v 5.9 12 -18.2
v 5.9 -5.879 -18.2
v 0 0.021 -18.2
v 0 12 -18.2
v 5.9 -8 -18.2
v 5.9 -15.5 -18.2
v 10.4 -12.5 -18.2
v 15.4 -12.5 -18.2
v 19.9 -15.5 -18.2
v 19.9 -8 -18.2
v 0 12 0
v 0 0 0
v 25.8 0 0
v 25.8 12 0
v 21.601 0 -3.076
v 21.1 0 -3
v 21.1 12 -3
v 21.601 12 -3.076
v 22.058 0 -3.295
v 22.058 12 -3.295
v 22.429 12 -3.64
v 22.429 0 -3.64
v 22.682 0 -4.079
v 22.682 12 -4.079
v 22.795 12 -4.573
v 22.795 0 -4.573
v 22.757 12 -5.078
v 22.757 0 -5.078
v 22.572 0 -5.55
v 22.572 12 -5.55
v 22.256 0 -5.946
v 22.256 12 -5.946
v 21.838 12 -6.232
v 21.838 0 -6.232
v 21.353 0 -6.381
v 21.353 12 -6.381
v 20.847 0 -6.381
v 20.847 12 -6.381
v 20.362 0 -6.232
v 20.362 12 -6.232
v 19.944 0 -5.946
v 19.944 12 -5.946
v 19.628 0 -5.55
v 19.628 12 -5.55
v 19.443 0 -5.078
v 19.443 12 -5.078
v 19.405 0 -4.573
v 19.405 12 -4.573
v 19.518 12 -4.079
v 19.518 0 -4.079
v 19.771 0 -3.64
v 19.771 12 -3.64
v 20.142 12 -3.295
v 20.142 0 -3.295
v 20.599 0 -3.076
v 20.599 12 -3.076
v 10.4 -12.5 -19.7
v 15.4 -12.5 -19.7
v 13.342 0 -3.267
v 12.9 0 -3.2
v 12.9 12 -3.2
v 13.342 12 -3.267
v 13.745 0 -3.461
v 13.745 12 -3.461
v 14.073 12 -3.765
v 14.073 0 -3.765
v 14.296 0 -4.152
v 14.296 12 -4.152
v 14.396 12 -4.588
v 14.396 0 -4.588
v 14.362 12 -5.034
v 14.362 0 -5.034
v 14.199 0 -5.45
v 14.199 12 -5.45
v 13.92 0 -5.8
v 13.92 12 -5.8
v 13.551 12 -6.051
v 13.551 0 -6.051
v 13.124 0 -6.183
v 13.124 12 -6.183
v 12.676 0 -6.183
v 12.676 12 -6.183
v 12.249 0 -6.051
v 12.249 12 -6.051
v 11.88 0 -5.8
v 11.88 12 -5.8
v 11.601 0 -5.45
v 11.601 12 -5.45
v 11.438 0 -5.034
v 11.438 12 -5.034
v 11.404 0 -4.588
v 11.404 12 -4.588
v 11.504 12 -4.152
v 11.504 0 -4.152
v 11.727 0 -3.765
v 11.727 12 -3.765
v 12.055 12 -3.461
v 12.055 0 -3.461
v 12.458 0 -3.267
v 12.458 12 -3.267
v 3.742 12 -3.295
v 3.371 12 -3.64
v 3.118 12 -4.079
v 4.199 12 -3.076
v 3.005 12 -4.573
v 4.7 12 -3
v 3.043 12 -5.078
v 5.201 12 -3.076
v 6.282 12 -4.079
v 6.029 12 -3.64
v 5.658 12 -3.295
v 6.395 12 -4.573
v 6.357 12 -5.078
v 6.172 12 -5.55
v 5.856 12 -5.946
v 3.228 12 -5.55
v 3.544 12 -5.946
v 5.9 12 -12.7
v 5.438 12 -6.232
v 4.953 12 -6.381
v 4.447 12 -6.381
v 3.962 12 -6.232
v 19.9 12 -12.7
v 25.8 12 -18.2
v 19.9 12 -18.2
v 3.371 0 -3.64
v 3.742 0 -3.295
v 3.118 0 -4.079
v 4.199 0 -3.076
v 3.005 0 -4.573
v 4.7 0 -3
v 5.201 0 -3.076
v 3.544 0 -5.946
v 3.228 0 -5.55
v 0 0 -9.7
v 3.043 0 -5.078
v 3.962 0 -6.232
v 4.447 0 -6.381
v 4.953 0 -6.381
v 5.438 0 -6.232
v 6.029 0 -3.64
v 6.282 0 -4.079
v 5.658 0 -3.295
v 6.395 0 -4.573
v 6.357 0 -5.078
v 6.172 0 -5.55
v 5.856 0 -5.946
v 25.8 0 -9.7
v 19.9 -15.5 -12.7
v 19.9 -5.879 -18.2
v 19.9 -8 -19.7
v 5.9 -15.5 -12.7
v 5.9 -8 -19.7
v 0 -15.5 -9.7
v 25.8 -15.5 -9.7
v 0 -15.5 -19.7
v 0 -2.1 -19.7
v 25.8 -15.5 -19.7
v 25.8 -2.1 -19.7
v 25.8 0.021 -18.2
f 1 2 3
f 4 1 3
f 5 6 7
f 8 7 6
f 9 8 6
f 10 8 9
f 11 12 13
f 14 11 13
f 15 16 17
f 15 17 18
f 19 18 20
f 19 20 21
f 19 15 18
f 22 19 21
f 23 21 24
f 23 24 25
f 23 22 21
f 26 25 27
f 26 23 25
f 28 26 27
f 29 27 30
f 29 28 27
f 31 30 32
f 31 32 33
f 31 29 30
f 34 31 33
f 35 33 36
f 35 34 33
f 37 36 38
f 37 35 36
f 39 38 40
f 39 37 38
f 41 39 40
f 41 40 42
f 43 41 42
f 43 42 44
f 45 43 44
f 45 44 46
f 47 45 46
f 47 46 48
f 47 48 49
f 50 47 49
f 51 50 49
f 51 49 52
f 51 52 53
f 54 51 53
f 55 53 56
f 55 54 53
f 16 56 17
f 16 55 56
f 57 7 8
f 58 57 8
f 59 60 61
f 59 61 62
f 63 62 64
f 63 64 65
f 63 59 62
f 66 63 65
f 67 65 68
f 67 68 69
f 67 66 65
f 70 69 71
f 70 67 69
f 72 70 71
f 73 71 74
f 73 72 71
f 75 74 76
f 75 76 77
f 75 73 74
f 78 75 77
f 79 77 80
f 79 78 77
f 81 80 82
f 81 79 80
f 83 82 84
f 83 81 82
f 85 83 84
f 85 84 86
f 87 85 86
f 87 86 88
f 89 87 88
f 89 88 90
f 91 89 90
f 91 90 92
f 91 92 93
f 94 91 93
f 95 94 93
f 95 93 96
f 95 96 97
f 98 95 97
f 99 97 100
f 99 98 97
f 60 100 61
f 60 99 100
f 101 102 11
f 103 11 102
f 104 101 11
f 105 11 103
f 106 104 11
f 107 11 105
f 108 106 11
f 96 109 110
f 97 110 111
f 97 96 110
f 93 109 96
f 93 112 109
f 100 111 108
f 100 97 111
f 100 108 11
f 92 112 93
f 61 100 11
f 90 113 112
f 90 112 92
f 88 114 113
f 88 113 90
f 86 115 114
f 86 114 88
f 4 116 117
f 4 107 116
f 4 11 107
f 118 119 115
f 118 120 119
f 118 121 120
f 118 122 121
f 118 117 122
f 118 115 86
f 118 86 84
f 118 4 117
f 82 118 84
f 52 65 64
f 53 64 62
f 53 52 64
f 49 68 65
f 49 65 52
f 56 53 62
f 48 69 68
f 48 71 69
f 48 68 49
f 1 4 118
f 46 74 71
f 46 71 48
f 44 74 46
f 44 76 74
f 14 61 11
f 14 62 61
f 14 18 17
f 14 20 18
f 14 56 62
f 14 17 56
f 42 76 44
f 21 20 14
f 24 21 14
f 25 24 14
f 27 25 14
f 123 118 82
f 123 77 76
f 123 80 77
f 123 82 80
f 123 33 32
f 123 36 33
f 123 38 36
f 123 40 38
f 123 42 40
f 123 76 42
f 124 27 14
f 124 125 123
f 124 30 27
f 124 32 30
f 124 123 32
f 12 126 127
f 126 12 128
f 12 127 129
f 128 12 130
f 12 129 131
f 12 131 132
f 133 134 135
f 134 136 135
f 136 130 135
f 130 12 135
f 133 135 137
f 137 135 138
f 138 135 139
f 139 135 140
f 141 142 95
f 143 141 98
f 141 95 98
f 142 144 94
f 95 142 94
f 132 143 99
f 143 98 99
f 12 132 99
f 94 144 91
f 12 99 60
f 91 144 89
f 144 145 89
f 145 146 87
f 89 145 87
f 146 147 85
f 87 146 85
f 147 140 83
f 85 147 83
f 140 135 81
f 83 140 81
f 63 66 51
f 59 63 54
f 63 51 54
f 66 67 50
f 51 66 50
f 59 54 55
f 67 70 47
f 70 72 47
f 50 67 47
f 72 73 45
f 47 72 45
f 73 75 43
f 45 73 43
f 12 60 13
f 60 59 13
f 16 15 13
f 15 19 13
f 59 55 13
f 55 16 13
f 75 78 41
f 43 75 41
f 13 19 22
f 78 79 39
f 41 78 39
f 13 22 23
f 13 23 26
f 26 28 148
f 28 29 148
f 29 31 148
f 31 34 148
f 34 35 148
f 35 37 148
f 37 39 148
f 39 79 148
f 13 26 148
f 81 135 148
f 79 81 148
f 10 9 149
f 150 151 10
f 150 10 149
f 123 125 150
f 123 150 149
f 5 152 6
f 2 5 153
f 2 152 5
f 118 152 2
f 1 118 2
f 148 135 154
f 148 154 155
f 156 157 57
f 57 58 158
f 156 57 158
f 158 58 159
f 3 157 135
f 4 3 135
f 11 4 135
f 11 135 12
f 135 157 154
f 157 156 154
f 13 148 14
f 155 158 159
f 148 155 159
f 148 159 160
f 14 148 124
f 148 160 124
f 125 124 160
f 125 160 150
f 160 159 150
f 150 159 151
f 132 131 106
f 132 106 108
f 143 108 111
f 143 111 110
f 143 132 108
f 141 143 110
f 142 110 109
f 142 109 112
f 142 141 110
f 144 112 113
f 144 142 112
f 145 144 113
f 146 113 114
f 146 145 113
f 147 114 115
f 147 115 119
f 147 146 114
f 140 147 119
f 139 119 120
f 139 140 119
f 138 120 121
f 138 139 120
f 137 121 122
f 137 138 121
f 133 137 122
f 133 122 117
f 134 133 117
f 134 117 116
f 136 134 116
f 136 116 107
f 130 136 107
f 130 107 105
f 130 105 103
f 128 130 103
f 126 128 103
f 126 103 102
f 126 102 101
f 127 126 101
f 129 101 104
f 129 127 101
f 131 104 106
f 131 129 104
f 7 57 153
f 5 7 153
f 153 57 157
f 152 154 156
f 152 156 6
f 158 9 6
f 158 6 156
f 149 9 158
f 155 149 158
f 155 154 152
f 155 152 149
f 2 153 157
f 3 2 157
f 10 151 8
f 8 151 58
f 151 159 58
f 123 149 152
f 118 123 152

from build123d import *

# Parameters (mm, degrees)
SKETCH1_R           = 1.7
SKETCH1_R_2         = 1.5
BOSS_EXTRUDE1_DEPTH = 12
BOSS_EXTRUDE2_DEPTH = 15.5
SKETCH5_W           = 25.8
SKETCH5_H           = 1.5
BOSS_EXTRUDE3_DEPTH = 3
BOSS_EXTRUDE4_DEPTH = 1.5
CHAMFER1_SIZE       = 1.5


with BuildPart() as part:
    # Sketch1 → Boss-Extrude1 (new body)
    with BuildSketch(Plane(origin=(0, 0, 0), x_dir=(1, 0, 0), z_dir=(0, 1, 0))):
        Polygon((0, 0), (25.8, 0), (25.8, 18.2), (19.9, 18.2), (19.9, 12.7), (5.9, 12.7), (5.9, 18.2), (0, 18.2), align=None)
        with Locations(Location((4.7, 4.7, 0), (0, 0, 270))):
            Circle(SKETCH1_R, mode=Mode.SUBTRACT)
        with Locations(Location((12.9, 4.7, 0), (0, 0, 270))):
            Circle(SKETCH1_R_2, mode=Mode.SUBTRACT)
        with Locations(Location((21.1, 4.7, 0), (0, 0, 270))):
            Circle(SKETCH1_R, mode=Mode.SUBTRACT)
    extrude(amount=BOSS_EXTRUDE1_DEPTH)

    # Sketch4 → Boss-Extrude2 (add)
    with BuildSketch(Plane.XZ):
        Polygon((19.9, -18.2), (19.9, -12.7), (5.9, -12.7), (5.9, -18.2), (0, -18.2), (0, -9.7), (25.8, -9.7), (25.8, -18.2), align=None)
    extrude(amount=BOSS_EXTRUDE2_DEPTH)

    # Sketch5 → Boss-Extrude3 (add)
    with BuildSketch(Plane.XZ.offset(15.5)):
        with Locations((12.9, -18.95)):
            Rectangle(SKETCH5_W, SKETCH5_H)
    extrude(amount=-BOSS_EXTRUDE3_DEPTH)

    # Sketch6 → Boss-Extrude4 (add)
    with BuildSketch(Plane(origin=(0, 0, -19.7), x_dir=(-1, 0, 0), z_dir=(0, 0, -1))):
        Polygon((-25.8, -12.5), (-25.8, -2.1), (-15.4, -12.5), align=None)
        Polygon((0, -12.5), (-10.4, -12.5), (0, -2.1), align=None)
    extrude(amount=-BOSS_EXTRUDE4_DEPTH)

    # Chamfer1
    chamfer1_edges = [part.edges().sort_by_distance(p)[0] for p in [
        (22.85, -5.05, -18.2),
        (2.95, -5.05, -18.2),
    ]]
    chamfer(chamfer1_edges, length=CHAMFER1_SIZE - 0.0001)  # a hair under: the kernel refuses the full size


solid = part.part
